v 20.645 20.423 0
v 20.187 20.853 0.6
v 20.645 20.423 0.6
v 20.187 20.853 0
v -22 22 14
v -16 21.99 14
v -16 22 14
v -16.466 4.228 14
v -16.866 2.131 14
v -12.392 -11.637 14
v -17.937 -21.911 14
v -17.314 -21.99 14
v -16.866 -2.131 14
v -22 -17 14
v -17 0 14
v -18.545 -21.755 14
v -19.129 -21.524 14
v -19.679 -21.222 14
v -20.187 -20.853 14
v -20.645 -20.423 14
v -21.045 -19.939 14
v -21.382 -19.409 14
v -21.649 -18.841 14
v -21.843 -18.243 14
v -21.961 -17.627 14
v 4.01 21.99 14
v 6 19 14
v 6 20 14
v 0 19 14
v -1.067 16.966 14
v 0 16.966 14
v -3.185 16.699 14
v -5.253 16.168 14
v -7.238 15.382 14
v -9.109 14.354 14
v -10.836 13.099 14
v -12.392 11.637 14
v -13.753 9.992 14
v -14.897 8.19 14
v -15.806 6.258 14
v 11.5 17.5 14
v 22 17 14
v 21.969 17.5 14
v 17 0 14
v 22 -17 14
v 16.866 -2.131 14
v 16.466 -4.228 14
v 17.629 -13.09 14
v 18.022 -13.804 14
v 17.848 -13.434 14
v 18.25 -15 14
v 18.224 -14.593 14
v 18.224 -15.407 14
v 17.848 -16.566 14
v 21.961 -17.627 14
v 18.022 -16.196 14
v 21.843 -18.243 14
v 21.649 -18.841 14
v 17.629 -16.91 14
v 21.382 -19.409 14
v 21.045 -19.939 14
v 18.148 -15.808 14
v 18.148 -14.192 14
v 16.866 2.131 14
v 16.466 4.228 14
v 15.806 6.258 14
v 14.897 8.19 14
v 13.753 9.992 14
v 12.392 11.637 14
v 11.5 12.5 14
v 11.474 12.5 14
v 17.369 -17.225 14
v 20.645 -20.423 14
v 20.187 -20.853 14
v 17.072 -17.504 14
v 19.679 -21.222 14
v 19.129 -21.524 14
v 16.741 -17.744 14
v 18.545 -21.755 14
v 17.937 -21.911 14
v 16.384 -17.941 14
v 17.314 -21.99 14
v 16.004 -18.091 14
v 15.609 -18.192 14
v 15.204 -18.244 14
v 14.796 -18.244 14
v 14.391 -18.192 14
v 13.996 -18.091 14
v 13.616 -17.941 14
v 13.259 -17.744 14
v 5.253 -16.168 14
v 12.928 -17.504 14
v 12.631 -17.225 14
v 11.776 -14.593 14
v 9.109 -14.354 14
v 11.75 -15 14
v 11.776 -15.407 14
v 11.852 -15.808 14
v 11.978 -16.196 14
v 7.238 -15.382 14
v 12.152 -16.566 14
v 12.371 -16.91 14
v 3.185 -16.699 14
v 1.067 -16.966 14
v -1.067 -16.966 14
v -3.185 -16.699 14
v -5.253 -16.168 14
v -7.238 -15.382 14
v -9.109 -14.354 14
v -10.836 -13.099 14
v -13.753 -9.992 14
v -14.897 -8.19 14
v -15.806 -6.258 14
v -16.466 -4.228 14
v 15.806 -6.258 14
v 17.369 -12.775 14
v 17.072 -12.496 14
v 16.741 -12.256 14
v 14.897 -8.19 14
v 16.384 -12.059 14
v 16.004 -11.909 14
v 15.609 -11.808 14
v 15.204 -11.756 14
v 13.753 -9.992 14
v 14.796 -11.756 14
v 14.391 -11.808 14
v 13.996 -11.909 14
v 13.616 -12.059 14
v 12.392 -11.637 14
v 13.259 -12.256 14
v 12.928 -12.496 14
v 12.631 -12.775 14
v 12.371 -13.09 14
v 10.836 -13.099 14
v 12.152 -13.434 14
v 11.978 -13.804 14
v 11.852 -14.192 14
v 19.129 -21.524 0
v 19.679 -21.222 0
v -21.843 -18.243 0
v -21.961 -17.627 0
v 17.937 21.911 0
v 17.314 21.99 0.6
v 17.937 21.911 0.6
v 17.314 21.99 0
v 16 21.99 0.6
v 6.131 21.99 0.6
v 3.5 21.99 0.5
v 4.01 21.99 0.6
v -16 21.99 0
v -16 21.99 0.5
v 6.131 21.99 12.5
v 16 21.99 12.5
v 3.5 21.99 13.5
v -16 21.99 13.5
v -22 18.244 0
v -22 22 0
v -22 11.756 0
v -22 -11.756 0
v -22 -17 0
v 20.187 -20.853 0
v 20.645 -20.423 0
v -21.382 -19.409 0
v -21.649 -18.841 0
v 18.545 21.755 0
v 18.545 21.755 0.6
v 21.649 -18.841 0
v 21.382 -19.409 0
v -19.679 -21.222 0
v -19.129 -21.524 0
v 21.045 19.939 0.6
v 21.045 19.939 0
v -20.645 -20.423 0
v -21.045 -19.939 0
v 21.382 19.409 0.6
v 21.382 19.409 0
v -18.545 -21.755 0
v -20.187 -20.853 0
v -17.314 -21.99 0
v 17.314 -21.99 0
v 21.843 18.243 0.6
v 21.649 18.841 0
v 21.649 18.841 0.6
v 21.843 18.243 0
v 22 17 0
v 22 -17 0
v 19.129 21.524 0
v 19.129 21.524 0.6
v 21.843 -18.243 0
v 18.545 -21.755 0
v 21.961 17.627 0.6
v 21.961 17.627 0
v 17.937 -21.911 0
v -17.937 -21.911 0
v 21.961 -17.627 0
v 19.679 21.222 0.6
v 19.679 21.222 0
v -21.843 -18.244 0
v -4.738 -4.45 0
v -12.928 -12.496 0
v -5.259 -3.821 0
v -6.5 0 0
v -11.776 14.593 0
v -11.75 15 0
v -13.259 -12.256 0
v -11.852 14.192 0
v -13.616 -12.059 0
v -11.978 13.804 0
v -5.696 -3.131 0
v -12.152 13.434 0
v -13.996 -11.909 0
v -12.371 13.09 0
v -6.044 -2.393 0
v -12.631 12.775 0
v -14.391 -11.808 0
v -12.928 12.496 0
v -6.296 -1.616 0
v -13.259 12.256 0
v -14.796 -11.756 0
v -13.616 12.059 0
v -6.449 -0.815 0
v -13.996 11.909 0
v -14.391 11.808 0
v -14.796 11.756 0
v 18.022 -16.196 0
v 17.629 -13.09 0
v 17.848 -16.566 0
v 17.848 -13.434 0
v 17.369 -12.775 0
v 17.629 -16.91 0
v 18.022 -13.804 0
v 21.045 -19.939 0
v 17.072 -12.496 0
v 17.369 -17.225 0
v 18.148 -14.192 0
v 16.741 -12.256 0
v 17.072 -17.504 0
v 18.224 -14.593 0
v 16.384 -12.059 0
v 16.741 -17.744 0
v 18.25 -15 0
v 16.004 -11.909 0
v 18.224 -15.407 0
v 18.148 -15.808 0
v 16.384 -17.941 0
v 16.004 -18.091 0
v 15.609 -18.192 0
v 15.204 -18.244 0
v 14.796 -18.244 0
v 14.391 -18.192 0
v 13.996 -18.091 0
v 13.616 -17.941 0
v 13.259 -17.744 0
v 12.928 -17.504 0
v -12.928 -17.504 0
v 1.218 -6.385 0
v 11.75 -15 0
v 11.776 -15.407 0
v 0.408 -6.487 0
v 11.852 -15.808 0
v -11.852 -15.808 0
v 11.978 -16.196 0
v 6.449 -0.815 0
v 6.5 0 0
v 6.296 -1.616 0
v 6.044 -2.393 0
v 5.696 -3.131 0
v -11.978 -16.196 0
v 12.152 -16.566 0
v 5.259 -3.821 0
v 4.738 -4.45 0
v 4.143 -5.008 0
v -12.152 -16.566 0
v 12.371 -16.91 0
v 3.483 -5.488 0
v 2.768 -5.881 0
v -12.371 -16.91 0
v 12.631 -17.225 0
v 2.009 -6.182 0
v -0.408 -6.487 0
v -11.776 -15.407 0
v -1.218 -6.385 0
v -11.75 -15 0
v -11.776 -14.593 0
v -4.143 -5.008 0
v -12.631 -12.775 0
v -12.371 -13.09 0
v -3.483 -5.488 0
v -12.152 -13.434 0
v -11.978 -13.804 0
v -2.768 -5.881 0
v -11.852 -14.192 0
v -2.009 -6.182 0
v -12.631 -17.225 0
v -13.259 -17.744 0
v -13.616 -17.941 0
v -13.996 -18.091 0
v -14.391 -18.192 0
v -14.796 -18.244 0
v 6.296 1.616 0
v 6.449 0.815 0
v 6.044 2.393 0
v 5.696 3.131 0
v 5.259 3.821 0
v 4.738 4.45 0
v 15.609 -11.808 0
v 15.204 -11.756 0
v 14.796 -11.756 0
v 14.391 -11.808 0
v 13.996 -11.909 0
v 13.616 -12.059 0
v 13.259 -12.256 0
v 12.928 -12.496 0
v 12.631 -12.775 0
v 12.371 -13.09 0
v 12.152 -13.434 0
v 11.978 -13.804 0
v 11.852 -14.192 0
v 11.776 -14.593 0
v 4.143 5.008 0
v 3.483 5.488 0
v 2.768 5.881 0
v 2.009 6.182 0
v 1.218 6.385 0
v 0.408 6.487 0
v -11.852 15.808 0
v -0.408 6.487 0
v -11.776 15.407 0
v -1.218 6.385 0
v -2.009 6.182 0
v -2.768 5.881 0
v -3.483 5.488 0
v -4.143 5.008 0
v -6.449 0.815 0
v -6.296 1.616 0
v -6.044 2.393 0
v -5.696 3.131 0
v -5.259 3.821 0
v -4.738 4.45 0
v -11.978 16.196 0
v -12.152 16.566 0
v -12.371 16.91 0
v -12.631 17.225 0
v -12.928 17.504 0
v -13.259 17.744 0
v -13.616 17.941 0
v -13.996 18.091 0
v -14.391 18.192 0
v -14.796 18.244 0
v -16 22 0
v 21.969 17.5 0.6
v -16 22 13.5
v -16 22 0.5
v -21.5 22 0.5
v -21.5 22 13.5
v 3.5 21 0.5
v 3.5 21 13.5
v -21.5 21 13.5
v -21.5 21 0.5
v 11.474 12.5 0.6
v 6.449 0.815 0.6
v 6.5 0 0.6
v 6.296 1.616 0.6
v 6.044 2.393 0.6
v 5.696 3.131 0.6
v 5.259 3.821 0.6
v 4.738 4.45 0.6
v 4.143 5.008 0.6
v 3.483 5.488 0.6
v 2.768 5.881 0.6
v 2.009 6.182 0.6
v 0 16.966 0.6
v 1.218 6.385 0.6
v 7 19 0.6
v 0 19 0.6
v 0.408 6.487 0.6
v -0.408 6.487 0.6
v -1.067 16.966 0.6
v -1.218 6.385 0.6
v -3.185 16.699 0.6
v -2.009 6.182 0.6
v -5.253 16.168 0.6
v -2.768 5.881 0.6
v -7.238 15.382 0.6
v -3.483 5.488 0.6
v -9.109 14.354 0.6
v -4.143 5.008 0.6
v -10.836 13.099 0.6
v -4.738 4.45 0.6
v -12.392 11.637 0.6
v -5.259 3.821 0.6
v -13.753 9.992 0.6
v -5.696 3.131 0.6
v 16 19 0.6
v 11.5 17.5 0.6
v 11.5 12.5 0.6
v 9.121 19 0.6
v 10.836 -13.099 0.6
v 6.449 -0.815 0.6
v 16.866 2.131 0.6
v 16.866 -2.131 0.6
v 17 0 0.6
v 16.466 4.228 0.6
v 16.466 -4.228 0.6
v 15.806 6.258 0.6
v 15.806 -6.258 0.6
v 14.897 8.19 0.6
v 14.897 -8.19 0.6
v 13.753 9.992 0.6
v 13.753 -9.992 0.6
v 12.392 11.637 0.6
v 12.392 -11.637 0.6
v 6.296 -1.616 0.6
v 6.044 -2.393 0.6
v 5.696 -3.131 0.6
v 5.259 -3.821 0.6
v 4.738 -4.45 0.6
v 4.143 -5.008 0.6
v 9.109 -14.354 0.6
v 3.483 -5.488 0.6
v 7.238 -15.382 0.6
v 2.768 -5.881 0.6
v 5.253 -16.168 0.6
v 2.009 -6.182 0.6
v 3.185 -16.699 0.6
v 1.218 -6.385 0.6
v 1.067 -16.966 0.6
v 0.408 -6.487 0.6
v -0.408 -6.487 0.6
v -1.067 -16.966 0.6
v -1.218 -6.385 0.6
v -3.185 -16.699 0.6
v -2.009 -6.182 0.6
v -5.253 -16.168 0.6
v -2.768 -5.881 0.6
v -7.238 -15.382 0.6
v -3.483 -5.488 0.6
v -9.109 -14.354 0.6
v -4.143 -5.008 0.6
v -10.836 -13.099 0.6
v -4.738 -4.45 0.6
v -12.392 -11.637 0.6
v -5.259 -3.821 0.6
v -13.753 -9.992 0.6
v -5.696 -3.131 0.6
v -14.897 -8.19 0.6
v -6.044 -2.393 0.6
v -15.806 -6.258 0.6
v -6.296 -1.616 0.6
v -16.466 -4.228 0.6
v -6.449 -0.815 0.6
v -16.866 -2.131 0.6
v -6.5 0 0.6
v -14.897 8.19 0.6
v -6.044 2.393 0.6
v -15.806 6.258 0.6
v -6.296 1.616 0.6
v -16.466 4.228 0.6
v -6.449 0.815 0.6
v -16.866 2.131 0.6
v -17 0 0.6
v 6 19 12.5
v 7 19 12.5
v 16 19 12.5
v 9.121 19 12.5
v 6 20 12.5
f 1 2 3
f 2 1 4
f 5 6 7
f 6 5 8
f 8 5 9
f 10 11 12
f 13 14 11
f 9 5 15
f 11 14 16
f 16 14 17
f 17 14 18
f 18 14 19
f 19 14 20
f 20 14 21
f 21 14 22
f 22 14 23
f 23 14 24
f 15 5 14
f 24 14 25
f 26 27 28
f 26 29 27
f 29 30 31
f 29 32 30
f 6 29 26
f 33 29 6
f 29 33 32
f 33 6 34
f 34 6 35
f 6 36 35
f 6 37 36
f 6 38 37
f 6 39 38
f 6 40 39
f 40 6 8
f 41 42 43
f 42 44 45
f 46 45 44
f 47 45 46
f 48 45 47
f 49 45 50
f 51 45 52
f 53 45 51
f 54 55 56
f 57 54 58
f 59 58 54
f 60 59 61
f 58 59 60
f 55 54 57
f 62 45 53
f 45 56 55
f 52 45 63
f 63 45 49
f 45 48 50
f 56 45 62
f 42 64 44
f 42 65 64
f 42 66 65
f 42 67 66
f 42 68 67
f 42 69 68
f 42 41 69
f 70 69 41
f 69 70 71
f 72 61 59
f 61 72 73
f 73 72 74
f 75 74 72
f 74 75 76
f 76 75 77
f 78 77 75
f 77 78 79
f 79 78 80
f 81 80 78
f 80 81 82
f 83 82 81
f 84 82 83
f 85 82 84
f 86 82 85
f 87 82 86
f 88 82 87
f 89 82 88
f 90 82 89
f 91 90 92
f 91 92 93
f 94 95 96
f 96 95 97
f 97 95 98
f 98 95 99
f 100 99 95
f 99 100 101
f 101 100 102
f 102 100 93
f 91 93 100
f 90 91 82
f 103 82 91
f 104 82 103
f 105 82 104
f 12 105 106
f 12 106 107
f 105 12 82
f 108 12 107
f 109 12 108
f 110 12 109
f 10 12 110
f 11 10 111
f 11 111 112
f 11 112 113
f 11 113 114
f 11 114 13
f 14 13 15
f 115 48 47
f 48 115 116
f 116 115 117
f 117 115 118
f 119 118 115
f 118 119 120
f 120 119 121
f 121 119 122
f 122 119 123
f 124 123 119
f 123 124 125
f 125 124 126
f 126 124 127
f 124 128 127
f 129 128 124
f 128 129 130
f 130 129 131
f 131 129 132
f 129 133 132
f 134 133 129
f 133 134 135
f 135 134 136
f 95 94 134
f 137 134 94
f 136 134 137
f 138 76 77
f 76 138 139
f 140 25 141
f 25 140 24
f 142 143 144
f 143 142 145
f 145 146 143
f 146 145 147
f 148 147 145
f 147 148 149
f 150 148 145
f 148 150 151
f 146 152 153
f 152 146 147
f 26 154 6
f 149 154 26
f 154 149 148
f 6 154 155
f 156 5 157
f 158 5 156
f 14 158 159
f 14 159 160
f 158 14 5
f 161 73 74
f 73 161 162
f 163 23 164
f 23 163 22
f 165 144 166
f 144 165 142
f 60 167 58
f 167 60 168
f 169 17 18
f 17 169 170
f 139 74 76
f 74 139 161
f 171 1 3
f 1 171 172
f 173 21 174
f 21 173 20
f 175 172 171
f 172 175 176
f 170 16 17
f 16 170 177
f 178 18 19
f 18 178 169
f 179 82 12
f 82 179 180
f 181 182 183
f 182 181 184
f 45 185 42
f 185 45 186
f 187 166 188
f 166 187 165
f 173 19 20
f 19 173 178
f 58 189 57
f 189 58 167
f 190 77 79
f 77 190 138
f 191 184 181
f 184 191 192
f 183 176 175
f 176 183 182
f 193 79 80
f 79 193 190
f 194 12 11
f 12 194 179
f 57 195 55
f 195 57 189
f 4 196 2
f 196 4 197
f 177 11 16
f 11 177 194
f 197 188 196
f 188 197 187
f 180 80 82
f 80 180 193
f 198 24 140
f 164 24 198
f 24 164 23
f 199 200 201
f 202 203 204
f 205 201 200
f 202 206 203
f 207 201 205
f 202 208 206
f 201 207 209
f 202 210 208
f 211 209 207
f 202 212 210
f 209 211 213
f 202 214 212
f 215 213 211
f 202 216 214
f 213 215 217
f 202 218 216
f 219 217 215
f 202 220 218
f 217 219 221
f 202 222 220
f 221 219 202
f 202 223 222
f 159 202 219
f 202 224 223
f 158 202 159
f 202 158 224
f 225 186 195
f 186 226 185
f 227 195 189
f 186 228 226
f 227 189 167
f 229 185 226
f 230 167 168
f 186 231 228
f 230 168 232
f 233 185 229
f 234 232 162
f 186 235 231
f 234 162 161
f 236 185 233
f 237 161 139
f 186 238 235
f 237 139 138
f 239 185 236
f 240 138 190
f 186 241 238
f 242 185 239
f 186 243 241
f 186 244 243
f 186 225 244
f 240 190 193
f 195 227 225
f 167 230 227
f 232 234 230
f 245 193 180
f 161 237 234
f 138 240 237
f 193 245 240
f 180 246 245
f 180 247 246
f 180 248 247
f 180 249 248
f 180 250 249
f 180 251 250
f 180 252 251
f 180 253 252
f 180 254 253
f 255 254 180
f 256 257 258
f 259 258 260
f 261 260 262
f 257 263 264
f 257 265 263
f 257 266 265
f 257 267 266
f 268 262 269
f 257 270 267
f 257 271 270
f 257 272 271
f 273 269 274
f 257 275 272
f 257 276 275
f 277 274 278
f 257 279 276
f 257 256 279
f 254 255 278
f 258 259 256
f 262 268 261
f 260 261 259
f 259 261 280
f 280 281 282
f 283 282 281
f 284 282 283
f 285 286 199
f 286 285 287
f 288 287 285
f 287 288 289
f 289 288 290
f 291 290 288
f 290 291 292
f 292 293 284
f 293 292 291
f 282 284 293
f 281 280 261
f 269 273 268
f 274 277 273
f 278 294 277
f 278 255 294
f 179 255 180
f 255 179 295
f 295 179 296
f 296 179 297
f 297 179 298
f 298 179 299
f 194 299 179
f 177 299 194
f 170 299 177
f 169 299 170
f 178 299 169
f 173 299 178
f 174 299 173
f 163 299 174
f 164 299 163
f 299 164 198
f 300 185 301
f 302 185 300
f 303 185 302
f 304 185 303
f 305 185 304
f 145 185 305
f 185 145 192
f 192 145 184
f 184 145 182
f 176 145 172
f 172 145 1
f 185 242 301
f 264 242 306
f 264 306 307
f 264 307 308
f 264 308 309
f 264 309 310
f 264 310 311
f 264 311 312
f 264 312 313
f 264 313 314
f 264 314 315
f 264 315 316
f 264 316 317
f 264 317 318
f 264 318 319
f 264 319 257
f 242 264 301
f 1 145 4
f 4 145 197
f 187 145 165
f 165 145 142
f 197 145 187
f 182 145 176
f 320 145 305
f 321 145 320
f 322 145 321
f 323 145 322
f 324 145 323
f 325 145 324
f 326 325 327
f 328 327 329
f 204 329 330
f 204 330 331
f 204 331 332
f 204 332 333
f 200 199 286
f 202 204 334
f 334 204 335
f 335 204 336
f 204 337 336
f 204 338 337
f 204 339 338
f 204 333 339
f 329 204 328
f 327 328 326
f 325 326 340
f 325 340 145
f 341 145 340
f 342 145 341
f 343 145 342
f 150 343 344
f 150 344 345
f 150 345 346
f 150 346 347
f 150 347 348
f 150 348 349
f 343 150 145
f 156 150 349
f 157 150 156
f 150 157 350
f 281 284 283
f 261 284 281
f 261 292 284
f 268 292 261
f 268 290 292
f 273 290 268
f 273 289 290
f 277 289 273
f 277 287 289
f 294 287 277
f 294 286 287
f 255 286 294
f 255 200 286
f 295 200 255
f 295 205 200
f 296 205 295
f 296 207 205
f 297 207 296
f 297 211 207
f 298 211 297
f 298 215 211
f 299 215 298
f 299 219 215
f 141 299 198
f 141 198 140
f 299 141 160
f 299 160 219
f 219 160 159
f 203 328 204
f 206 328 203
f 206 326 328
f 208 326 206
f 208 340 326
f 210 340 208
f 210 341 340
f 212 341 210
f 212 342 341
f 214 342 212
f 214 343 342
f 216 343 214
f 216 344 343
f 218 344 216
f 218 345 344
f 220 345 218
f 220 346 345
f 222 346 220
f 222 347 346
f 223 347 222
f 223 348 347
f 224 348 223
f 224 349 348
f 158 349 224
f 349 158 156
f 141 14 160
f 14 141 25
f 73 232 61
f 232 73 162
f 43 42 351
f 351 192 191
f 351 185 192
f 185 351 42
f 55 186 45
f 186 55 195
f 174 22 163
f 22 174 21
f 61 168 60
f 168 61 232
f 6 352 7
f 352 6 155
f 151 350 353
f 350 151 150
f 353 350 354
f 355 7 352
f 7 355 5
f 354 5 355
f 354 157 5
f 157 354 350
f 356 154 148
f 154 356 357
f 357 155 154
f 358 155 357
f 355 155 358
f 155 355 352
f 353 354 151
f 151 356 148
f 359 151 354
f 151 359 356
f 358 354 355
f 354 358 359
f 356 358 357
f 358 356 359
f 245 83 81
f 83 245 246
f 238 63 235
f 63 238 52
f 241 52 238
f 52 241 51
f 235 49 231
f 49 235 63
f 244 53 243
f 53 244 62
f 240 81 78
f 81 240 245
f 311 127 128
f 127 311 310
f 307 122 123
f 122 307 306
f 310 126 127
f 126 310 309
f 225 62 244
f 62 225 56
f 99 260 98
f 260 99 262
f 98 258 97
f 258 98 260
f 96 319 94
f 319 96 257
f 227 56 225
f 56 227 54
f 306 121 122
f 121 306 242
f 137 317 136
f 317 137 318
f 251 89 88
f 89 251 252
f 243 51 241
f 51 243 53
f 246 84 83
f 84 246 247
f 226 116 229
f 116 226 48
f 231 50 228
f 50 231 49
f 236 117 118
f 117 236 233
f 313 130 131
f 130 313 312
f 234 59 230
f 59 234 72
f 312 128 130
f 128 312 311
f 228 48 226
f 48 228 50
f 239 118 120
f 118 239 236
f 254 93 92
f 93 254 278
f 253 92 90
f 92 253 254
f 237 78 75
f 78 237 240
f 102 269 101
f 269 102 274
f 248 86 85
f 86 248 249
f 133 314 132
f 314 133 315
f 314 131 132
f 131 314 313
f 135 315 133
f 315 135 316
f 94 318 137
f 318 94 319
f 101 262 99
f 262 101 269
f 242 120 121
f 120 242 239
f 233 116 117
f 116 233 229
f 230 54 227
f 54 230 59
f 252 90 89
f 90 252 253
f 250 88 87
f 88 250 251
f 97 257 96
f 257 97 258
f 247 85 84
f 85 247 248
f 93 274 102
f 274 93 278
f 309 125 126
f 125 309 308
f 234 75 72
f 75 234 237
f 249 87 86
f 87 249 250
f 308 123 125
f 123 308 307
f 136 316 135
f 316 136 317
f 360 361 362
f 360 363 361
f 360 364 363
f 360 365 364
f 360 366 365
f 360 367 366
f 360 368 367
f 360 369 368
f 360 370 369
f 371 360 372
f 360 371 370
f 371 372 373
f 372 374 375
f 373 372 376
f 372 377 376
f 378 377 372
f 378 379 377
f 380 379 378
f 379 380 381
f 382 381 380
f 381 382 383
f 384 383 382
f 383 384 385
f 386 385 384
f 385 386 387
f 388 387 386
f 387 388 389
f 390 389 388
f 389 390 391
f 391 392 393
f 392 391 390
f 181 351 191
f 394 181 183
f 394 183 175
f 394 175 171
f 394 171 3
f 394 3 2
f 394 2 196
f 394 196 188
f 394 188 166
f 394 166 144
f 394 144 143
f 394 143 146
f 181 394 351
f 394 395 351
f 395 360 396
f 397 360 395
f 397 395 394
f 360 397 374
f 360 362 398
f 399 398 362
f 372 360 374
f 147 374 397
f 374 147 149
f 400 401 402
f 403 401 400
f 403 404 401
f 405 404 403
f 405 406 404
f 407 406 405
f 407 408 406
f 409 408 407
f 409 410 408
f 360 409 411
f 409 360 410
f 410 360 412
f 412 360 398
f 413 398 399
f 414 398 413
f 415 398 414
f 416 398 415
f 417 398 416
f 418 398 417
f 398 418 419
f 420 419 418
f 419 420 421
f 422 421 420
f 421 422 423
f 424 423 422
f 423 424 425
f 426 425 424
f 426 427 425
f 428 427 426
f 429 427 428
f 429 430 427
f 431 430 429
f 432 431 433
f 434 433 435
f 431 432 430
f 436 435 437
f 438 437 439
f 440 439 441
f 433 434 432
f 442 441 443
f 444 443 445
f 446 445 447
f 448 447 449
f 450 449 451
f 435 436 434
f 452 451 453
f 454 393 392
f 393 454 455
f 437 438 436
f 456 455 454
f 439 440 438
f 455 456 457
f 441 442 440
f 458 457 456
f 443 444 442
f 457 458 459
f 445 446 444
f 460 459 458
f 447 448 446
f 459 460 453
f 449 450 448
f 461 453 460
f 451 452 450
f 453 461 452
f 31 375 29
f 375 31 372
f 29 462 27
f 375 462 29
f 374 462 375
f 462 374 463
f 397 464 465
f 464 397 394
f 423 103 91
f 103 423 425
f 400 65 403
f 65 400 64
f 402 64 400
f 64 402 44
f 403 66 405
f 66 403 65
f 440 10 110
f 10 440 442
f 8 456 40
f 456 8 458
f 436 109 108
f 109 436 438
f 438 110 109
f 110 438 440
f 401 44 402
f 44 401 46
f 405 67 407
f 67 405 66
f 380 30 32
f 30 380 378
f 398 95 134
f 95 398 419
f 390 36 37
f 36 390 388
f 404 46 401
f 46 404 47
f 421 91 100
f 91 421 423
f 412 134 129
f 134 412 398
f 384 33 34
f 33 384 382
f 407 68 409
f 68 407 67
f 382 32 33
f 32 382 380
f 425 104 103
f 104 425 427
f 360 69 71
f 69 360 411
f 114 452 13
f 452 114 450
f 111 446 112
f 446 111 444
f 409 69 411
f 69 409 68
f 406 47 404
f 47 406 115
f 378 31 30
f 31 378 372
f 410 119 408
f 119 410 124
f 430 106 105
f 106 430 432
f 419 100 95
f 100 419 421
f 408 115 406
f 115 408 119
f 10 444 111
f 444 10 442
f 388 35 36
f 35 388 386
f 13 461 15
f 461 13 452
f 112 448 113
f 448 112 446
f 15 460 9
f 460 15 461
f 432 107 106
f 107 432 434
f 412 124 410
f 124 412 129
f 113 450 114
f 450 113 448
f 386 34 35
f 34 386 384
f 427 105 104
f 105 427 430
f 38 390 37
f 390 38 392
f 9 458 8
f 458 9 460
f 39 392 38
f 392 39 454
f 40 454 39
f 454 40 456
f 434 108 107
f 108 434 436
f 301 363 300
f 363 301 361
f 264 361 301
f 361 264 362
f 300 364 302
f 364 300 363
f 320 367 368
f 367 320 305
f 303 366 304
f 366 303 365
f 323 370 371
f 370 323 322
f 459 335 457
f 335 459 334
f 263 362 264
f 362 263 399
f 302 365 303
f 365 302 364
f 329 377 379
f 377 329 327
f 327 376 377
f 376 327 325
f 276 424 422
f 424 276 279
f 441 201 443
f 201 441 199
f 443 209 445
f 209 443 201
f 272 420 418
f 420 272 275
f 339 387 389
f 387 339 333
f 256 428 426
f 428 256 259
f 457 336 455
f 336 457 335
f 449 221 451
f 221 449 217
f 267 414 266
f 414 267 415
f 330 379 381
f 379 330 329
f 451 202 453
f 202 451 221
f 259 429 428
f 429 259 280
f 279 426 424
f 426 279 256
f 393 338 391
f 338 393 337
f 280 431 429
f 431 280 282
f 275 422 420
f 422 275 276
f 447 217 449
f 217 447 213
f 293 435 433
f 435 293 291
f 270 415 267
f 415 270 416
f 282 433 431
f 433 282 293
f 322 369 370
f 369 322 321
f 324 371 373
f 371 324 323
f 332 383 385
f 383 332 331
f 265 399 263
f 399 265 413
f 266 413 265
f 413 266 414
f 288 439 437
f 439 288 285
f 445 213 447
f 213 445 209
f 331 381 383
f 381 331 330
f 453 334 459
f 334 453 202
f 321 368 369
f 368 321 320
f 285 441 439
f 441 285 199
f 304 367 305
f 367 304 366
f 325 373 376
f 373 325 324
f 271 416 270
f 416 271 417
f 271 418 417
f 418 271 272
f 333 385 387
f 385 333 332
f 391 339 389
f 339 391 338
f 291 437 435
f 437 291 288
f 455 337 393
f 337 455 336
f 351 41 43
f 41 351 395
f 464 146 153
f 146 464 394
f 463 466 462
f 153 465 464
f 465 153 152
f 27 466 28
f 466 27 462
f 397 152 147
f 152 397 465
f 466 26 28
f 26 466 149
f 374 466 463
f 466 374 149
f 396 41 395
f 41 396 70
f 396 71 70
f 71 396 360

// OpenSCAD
$fn = 50;


difference() {
	union() {
		hull() {
			translate(v = [-17.0000000000, 17.0000000000, 0]) {
				cylinder(h = 14, r = 5);
			}
			translate(v = [17.0000000000, 17.0000000000, 0]) {
				cylinder(h = 14, r = 5);
			}
			translate(v = [-17.0000000000, -17.0000000000, 0]) {
				cylinder(h = 14, r = 5);
			}
			translate(v = [17.0000000000, -17.0000000000, 0]) {
				cylinder(h = 14, r = 5);
			}
		}
		translate(v = [-22.0000000000, 16.0000000000, 0]) {
			cube(size = [6, 6, 14]);
		}
	}
	union() {
		translate(v = [-22.5000000000, -15.0000000000, -250.0000000000]) {
			rotate(a = [0, 0, 0]) {
				difference() {
					union() {
						hull() {
							translate(v = [7.5000000000, 0, 0]) {
								cylinder(h = 250, r = 3.2500000000, r1 = 3.2500000000, r2 = 3.2500000000);
							}
							translate(v = [-7.5000000000, 0, 0]) {
								cylinder(h = 250, r = 3.2500000000, r1 = 3.2500000000, r2 = 3.2500000000);
							}
						}
					}
					union();
				}
			}
		}
		translate(v = [-22.5000000000, 15.0000000000, -250.0000000000]) {
			rotate(a = [0, 0, 0]) {
				difference() {
					union() {
						hull() {
							translate(v = [7.5000000000, 0, 0]) {
								cylinder(h = 250, r = 3.2500000000, r1 = 3.2500000000, r2 = 3.2500000000);
							}
							translate(v = [-7.5000000000, 0, 0]) {
								cylinder(h = 250, r = 3.2500000000, r1 = 3.2500000000, r2 = 3.2500000000);
							}
						}
					}
					union();
				}
			}
		}
		translate(v = [-21.5000000000, 21.0000000000, 0.5000000000]) {
			cube(size = [25, 1, 13.0000000000]);
		}
		translate(v = [15.0000000000, -15.0000000000, -50.0000000000]) {
			cylinder(h = 100, r = 3.2500000000);
		}
		translate(v = [0.0000000000, 11.0000000000, 0.6000000000]) {
			cube(size = [11, 8, 16.4000000000]);
		}
		translate(v = [0, 0, 0.6000000000]) {
			cylinder(h = 16.4000000000, r = 17.0000000000);
		}
		translate(v = [0, 0, -7.0000000000]) {
			cylinder(h = 14, r = 6.5000000000);
		}
		translate(v = [0.0000000000, 17.5000000000, 0.6000000000]) {
			cube(size = [22.0000000000, 1.5000000000, 16.4000000000]);
		}
		translate(v = [16.0000000000, 17.5000000000, 0.6000000000]) {
			cube(size = [6, 4.5000000000, 16.4000000000]);
		}
		translate(v = [6.0000000000, 17.5000000000, 12.5000000000]) {
			cube(size = [16, 4.5000000000, 1.5000000000]);
		}
		translate(v = [3.2500000000, 22.7500000000, 0.6000000000]) {
			rotate(a = [0, 0, -45]) {
				cube(size = [7.5000000000, 1.5000000000, 16.4000000000]);
			}
		}
		translate(v = [2.5000000000, 12.5000000000, 0.6000000000]) {
			cube(size = [9.0000000000, 5, 13.4000000000]);
		}
	}
}
